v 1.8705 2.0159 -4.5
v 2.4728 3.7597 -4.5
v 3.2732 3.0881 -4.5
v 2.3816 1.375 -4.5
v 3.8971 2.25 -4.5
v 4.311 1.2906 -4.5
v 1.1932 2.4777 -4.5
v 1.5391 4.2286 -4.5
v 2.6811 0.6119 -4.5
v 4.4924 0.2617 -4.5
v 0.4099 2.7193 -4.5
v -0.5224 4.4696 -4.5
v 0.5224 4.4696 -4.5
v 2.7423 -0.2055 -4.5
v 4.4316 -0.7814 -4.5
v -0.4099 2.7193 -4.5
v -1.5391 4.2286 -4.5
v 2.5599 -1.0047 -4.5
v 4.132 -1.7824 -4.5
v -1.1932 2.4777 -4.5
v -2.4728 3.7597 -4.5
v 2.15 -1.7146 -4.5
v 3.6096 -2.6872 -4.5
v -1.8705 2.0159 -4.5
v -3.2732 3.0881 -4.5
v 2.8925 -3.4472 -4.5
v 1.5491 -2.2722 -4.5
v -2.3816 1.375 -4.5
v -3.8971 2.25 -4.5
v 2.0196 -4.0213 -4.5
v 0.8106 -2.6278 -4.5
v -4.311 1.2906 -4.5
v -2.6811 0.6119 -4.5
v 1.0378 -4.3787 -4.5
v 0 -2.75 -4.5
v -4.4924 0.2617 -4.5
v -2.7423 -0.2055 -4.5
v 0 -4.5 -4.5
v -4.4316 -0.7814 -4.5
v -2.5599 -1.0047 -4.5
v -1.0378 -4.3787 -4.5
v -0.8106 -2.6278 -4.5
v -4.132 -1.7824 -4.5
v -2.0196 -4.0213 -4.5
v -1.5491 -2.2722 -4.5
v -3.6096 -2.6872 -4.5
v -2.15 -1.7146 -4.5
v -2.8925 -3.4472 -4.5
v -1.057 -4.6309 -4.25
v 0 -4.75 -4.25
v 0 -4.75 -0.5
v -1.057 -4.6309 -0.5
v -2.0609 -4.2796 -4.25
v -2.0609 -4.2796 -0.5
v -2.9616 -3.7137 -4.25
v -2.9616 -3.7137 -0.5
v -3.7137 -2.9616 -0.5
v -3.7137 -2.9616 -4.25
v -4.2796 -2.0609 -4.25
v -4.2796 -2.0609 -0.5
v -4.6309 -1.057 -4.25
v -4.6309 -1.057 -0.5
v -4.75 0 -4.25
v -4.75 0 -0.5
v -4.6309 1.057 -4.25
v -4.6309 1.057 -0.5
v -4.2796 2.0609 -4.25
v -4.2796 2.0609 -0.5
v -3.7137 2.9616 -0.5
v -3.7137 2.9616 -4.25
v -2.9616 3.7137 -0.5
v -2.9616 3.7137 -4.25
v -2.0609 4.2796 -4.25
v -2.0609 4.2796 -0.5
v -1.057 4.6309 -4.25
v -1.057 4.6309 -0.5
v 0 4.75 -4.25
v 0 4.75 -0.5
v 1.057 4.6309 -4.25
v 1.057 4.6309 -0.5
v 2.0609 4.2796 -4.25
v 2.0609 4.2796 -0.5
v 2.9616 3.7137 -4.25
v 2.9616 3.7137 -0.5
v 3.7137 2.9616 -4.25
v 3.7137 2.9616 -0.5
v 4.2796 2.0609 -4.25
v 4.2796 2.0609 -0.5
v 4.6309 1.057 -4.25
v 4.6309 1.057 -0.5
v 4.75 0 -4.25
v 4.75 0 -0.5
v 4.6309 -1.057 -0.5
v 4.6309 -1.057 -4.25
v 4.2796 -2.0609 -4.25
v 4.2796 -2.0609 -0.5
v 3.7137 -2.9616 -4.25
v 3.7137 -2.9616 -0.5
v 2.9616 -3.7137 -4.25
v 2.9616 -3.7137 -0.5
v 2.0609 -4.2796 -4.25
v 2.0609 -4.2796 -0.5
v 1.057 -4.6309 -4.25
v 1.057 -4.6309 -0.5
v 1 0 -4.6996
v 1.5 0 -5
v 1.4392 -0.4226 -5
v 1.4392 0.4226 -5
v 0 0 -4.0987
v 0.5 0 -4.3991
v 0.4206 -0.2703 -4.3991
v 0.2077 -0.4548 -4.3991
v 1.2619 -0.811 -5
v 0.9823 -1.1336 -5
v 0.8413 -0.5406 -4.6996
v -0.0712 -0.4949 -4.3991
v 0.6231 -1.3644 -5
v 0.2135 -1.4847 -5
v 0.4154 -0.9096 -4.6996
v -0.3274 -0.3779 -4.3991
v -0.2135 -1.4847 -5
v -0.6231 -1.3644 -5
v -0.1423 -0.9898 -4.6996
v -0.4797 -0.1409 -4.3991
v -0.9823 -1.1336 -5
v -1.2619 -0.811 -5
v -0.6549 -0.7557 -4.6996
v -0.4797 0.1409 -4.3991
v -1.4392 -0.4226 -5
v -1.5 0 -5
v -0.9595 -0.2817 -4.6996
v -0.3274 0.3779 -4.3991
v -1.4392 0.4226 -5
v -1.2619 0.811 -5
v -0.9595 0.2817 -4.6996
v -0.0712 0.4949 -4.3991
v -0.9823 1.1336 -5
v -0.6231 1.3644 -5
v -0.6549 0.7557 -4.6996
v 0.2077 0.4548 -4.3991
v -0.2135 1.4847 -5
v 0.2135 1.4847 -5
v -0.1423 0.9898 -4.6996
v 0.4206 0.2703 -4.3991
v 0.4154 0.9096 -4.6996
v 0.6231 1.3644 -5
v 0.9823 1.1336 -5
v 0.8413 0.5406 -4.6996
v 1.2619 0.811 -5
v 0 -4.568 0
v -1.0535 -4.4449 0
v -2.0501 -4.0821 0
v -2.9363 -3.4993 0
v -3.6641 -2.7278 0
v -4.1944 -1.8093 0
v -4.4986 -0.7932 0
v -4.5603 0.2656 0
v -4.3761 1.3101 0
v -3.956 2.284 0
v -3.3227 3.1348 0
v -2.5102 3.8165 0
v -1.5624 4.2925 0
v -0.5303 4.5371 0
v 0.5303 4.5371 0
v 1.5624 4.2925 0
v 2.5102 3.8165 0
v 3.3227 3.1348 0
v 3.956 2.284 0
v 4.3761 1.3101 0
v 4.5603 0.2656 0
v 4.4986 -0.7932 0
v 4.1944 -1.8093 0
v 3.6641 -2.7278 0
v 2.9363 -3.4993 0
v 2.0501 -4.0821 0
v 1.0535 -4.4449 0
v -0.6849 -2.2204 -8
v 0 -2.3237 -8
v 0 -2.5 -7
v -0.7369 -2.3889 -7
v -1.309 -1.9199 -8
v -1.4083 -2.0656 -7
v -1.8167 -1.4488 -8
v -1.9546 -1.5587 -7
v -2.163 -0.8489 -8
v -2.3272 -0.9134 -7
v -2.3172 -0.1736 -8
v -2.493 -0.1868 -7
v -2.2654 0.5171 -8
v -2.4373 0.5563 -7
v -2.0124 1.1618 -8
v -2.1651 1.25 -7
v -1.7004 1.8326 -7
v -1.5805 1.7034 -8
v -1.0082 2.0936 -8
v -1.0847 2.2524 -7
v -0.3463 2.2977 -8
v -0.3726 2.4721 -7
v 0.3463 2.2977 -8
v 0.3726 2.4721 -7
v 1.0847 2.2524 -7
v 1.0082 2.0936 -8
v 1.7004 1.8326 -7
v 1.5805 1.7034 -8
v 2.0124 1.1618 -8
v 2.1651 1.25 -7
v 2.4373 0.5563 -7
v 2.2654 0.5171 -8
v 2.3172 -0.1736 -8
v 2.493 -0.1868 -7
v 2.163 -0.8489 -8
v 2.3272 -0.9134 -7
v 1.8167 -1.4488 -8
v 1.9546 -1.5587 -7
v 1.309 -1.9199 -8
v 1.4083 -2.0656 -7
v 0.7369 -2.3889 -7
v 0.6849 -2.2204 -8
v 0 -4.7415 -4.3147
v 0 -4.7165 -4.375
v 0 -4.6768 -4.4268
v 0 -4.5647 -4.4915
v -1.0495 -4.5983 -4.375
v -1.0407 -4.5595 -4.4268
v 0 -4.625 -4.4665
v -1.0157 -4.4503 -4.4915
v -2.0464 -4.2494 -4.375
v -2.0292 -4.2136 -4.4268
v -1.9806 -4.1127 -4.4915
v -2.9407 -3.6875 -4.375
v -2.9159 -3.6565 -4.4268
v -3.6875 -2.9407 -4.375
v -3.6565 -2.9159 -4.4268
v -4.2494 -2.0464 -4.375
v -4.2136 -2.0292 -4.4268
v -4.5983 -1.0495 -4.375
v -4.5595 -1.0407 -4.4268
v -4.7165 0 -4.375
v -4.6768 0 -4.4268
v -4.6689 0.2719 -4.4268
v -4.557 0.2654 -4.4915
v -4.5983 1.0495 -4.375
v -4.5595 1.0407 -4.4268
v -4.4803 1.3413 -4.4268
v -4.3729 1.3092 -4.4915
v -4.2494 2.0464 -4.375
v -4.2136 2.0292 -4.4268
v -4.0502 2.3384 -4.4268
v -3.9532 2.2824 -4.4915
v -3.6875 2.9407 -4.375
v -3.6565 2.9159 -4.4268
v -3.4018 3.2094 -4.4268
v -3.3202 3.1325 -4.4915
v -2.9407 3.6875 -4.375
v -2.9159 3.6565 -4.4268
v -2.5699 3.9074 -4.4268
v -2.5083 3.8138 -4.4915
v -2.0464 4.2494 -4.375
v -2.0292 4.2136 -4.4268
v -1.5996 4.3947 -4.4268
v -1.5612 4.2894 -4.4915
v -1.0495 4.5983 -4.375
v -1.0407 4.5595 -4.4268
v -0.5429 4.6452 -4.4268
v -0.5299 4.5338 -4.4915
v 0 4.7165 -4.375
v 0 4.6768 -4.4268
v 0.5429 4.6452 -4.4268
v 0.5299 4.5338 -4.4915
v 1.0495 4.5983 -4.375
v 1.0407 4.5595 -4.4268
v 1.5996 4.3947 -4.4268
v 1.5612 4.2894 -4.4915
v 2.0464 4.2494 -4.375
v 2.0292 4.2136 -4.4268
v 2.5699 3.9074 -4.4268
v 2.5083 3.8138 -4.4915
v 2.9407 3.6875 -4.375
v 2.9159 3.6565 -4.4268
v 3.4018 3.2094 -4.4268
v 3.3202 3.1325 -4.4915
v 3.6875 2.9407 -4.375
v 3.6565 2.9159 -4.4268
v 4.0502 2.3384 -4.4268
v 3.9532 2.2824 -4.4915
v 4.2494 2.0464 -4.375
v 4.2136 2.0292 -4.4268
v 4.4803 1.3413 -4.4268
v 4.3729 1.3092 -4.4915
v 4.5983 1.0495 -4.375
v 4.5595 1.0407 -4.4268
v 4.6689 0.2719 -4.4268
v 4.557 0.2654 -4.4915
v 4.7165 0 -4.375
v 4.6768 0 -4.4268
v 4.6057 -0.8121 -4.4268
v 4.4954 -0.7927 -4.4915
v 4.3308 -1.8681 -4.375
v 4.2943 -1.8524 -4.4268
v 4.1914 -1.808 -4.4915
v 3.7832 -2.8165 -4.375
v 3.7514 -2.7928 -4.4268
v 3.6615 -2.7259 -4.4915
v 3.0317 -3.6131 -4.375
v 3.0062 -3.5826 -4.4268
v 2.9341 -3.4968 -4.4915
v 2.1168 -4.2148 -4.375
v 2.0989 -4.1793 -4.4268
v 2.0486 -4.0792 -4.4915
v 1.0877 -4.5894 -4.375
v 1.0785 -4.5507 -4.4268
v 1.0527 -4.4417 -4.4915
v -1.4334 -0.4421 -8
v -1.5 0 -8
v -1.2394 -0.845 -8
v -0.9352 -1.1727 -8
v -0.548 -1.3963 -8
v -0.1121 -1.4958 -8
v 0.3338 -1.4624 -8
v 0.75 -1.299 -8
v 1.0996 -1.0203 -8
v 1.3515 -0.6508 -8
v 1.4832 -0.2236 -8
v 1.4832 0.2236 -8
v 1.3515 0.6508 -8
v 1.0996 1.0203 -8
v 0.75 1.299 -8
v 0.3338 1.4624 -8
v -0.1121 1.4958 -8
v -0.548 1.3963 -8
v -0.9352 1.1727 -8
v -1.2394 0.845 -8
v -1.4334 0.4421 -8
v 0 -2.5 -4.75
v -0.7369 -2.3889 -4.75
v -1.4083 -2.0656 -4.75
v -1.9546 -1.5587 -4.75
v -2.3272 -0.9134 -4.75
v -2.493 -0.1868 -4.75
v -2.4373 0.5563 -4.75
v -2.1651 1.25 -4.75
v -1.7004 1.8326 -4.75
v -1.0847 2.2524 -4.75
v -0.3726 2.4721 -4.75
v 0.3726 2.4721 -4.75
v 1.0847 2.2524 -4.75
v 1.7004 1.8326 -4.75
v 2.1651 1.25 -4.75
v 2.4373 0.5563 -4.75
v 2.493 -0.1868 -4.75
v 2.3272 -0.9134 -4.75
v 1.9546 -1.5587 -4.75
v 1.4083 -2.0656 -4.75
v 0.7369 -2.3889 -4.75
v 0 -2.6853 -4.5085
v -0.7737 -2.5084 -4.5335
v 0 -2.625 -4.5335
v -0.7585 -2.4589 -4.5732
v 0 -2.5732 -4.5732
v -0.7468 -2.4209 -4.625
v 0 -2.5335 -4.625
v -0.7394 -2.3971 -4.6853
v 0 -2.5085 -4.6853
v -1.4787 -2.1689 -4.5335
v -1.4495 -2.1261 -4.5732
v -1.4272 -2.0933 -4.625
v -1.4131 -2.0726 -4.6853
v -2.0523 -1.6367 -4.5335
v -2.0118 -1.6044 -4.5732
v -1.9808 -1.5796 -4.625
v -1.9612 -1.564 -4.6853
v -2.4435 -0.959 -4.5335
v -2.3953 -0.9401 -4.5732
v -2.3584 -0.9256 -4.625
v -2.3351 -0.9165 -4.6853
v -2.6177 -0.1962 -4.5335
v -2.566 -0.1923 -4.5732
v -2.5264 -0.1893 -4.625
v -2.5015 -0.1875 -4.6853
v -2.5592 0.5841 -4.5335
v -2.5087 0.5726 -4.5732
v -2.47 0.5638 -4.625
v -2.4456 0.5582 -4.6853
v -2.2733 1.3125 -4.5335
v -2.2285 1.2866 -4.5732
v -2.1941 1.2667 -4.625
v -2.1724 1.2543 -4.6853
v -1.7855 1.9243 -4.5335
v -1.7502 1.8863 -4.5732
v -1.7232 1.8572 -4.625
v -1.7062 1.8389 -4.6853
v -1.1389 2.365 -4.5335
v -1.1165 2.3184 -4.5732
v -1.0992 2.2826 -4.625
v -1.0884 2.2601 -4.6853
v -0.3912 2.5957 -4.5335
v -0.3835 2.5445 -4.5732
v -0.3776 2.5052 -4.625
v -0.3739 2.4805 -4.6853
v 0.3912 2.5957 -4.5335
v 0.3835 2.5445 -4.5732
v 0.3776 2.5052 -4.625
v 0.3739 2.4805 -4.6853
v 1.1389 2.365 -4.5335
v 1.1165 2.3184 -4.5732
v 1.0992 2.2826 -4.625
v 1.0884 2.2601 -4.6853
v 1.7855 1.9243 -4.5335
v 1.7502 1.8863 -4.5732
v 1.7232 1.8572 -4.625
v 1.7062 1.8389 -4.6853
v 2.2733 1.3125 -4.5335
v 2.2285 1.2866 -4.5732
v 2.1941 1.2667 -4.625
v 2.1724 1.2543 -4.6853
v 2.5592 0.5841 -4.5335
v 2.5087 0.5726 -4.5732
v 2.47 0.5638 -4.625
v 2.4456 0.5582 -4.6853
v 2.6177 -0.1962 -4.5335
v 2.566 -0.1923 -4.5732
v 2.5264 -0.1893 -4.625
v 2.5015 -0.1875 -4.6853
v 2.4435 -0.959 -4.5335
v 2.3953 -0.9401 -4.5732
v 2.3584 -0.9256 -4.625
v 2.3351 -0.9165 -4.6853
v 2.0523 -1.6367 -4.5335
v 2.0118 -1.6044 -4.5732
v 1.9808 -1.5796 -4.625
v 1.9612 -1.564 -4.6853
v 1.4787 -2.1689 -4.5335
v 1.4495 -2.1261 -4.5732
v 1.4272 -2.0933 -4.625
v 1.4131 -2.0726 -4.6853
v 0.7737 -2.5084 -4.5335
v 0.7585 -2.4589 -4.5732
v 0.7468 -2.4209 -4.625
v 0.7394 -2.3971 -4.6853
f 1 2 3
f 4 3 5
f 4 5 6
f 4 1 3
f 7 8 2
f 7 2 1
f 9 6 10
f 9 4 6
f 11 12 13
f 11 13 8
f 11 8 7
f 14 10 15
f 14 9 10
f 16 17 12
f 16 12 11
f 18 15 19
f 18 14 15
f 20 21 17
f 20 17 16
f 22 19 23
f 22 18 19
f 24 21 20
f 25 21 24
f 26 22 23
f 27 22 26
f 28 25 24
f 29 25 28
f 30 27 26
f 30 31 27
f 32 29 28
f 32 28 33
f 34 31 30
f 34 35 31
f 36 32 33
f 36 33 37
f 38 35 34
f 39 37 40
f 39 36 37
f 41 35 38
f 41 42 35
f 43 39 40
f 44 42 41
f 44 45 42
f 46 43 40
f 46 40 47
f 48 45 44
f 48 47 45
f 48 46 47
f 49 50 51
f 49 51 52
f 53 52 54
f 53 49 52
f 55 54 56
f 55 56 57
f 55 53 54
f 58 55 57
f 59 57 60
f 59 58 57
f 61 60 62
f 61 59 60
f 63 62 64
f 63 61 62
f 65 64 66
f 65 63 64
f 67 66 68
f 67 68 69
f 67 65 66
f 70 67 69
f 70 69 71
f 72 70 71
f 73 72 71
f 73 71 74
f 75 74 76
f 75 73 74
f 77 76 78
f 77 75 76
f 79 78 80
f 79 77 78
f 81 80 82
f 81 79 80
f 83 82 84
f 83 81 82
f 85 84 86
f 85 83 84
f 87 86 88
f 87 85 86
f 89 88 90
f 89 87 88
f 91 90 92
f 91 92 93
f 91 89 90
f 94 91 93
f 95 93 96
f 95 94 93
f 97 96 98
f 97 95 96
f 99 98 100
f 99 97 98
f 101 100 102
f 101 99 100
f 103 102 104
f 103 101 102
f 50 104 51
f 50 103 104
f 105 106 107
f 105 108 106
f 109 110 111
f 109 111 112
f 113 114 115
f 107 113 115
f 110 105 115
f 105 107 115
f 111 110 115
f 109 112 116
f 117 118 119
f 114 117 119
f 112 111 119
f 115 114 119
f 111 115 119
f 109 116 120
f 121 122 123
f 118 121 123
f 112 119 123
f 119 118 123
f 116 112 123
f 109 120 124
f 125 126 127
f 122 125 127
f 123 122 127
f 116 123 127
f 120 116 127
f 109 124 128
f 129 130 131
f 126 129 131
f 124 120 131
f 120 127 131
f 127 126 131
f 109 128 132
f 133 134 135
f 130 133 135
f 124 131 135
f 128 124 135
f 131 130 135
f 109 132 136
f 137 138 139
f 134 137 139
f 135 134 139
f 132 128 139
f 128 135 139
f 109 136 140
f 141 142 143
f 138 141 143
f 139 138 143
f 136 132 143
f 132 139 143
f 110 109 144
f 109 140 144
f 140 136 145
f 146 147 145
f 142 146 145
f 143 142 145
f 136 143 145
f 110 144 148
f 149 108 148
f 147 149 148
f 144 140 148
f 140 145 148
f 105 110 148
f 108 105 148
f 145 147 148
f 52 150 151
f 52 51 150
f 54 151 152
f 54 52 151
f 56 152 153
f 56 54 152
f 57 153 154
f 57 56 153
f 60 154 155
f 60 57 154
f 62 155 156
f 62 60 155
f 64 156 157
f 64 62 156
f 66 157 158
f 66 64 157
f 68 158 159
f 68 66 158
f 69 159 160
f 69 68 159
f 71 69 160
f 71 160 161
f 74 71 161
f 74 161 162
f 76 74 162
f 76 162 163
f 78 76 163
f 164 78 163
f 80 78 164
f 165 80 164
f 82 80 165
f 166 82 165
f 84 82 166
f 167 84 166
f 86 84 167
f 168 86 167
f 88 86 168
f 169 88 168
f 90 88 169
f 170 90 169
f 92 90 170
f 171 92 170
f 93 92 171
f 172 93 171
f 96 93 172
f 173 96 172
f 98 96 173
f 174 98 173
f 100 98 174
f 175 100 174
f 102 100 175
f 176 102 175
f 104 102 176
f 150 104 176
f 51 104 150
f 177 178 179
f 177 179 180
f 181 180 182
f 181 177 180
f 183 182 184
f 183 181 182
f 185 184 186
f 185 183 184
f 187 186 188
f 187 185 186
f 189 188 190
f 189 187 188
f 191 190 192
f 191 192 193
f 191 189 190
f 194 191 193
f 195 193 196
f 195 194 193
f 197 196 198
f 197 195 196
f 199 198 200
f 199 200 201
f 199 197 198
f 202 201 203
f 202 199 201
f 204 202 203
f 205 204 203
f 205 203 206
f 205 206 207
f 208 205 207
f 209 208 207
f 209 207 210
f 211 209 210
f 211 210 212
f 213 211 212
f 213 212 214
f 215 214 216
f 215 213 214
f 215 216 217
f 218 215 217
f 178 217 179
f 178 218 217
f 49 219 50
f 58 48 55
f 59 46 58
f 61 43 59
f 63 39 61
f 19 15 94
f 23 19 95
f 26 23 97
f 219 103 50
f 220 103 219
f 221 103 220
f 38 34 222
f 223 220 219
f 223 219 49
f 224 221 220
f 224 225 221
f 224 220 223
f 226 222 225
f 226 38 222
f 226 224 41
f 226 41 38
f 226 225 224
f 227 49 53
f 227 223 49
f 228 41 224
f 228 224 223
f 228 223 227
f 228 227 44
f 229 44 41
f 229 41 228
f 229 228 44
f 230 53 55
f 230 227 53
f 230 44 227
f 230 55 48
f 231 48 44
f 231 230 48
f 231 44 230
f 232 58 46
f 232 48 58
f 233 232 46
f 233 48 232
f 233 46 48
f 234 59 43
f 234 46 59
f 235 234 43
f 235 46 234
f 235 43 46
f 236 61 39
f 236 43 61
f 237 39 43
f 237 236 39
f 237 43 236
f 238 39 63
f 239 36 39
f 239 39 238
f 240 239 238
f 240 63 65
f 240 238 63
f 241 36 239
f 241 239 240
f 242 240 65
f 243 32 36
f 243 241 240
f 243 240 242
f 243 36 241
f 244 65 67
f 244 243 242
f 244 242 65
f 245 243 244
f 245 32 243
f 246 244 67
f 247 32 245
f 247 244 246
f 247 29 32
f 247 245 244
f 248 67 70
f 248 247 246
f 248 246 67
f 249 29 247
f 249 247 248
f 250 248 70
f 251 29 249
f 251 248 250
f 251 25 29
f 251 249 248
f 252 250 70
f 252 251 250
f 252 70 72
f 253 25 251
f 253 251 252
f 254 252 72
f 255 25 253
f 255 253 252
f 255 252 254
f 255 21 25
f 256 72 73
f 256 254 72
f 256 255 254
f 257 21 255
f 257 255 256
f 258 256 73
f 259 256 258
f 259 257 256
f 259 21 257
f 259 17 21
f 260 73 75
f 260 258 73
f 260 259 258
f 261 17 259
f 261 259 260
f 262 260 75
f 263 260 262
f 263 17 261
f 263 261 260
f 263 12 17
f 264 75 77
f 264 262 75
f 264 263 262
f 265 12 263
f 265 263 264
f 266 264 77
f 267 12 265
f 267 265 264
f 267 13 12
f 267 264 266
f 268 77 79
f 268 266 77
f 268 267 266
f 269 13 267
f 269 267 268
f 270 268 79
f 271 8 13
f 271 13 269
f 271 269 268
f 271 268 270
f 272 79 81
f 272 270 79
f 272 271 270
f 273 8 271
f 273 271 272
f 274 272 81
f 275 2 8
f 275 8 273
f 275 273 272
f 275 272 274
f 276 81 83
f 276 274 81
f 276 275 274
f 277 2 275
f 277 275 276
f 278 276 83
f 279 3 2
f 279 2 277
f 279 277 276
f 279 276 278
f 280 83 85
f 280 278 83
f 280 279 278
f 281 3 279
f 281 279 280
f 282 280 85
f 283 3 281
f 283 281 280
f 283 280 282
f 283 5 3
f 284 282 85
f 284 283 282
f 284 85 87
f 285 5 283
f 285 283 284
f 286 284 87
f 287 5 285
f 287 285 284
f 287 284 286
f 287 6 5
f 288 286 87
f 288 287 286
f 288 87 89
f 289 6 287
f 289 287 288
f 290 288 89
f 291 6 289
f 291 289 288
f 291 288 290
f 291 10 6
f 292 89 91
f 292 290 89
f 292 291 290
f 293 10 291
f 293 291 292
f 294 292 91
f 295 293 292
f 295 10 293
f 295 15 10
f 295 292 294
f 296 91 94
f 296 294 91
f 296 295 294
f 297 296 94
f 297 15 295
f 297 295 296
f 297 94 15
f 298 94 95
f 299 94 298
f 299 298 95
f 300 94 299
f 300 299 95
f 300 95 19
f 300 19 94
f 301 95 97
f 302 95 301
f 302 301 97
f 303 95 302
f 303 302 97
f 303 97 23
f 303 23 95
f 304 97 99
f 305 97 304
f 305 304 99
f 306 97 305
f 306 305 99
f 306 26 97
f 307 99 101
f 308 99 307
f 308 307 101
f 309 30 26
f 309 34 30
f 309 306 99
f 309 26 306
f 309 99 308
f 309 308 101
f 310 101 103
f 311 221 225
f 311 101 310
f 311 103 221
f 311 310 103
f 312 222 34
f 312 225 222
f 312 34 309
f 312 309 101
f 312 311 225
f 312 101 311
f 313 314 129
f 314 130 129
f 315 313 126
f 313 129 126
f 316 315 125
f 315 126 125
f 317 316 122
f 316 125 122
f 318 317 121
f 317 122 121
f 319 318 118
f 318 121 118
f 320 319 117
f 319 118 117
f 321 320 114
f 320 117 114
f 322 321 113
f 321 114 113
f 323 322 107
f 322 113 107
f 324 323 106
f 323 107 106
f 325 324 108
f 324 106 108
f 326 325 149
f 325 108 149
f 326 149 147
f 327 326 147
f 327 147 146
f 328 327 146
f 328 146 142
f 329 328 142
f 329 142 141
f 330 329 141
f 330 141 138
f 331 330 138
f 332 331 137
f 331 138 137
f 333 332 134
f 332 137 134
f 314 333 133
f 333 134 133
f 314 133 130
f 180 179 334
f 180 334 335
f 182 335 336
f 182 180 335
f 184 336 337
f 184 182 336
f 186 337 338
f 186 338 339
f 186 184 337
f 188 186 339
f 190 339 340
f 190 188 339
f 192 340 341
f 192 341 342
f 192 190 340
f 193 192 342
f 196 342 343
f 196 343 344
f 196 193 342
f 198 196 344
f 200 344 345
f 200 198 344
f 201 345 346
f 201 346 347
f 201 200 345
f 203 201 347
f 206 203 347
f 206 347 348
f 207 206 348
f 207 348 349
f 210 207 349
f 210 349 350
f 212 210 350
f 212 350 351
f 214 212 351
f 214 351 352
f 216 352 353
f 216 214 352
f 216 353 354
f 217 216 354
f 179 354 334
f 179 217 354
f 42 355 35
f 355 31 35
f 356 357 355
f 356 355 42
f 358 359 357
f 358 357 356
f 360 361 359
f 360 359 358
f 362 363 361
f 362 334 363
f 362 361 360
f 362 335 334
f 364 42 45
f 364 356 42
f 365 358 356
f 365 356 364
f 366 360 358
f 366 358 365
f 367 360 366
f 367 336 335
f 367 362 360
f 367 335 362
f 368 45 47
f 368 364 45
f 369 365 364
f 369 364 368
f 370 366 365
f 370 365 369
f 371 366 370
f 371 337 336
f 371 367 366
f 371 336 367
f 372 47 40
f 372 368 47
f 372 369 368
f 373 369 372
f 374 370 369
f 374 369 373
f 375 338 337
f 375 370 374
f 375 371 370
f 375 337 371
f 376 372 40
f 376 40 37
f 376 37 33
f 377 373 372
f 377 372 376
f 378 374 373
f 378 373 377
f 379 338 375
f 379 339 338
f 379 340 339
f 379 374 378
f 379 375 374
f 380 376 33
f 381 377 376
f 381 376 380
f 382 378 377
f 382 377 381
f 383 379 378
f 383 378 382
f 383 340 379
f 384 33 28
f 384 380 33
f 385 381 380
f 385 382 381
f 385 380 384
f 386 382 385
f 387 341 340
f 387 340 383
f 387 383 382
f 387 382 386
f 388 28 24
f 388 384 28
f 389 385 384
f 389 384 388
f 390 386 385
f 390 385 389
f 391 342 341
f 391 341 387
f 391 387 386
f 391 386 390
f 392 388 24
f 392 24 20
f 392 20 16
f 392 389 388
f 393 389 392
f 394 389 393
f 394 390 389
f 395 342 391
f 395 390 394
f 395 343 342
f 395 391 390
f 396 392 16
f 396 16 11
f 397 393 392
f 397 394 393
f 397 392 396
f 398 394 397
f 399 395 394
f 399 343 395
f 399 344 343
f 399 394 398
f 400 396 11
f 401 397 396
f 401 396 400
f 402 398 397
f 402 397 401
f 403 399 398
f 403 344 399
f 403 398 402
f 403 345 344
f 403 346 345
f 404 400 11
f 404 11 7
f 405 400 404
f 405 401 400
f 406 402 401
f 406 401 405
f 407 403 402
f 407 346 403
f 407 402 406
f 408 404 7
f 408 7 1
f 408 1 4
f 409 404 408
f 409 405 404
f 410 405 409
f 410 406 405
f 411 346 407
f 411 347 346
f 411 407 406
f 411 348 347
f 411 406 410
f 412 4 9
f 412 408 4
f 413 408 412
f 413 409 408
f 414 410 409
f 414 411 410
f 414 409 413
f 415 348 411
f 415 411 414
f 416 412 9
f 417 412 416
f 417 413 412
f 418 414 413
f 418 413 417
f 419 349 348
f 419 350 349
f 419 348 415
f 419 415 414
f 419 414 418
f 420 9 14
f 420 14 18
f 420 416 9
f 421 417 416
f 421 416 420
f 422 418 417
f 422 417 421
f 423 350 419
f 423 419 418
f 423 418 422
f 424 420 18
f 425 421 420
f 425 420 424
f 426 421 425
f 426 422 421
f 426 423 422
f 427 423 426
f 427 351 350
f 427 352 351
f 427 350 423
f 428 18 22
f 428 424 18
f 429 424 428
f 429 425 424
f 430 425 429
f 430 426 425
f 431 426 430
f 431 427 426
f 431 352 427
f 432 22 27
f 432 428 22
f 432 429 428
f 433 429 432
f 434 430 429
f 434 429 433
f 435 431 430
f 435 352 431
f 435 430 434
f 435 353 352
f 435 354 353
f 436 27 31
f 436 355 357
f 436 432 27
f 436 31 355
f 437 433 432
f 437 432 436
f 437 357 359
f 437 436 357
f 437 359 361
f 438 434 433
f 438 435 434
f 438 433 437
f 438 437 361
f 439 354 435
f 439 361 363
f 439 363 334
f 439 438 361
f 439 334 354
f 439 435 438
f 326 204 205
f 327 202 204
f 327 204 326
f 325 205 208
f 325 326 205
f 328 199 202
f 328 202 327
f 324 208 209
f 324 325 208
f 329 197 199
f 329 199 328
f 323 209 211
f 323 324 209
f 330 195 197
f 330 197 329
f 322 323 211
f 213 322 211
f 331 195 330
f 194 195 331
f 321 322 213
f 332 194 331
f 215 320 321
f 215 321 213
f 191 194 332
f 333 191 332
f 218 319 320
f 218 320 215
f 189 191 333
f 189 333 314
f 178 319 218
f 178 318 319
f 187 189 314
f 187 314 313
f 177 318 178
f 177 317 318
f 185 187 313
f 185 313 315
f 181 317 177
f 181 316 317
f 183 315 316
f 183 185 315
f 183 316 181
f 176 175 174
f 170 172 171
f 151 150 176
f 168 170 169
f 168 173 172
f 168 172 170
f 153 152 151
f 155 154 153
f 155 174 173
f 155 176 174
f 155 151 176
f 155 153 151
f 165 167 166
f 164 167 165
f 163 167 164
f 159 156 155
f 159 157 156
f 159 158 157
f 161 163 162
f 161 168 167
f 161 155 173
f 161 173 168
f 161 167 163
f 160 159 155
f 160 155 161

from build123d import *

# Parameters (mm, degrees)
F3_R     = 0.25
F4_SIZE2 = 0.1763269807
F4_SIZE  = 1
F6_D     = 3
F6_DEPTH = 3
F6_TIP   = 0.9012909285


# Not quite as in the source:
# - a fillet or chamfer that OpenCascade refuses, or shapes differently, is made with other operations: its cross-section is extruded or revolved along the edge and cut away or added


with BuildPart() as f1:
    # F0 (on Right) → F1 (revolve)
    with BuildSketch(Plane.YZ):
        Polygon((0, 0), (-4.75, 0), (-4.75, -4.5), (-2.5, -4.5), (-2.5, -8), (0, -8), align=None)
    revolve(axis=Axis((0, 0, -4), (0, 0, -1)))

    # F2: chamfer of 0.5 x 0.1819851171 on 1 edges, made by hand

    # F2_s1 → F2_t2 (revolve, cut)
    with BuildSketch(Plane.YZ):
        Polygon((-4.5680148829, 0), (-4.75, -0.5), (-4.75, 0), align=None)
    revolve(axis=Axis((0, 0, 0), (0, 0, -1)), mode=Mode.SUBTRACT)

    # F3
    f3_edges = [f1.edges().sort_by_distance(p)[0] for p in [
        (0, 4.75, -4.5),
        (0, 2.5, -4.5),
    ]]
    fillet(f3_edges, radius=F3_R)

    # F4
    f4_edges = [f1.edges().sort_by_distance(p)[0] for p in [
        (0, 2.5, -8),
    ]]
    chamfer(f4_edges, length=F4_SIZE, length2=F4_SIZE2)

    # F6
    with Locations(Plane(origin=(0, 0, -8), x_dir=(1, 0, 0), z_dir=(0, 0, -1))):
        with Locations((0, 0)):
            Hole(F6_D / 2, depth=F6_DEPTH)
            with Locations((0, 0, -(F6_DEPTH + F6_TIP / 2))):  # 118° drill point
                Cone(0, F6_D / 2, F6_TIP, mode=Mode.SUBTRACT)


solid = f1.part
